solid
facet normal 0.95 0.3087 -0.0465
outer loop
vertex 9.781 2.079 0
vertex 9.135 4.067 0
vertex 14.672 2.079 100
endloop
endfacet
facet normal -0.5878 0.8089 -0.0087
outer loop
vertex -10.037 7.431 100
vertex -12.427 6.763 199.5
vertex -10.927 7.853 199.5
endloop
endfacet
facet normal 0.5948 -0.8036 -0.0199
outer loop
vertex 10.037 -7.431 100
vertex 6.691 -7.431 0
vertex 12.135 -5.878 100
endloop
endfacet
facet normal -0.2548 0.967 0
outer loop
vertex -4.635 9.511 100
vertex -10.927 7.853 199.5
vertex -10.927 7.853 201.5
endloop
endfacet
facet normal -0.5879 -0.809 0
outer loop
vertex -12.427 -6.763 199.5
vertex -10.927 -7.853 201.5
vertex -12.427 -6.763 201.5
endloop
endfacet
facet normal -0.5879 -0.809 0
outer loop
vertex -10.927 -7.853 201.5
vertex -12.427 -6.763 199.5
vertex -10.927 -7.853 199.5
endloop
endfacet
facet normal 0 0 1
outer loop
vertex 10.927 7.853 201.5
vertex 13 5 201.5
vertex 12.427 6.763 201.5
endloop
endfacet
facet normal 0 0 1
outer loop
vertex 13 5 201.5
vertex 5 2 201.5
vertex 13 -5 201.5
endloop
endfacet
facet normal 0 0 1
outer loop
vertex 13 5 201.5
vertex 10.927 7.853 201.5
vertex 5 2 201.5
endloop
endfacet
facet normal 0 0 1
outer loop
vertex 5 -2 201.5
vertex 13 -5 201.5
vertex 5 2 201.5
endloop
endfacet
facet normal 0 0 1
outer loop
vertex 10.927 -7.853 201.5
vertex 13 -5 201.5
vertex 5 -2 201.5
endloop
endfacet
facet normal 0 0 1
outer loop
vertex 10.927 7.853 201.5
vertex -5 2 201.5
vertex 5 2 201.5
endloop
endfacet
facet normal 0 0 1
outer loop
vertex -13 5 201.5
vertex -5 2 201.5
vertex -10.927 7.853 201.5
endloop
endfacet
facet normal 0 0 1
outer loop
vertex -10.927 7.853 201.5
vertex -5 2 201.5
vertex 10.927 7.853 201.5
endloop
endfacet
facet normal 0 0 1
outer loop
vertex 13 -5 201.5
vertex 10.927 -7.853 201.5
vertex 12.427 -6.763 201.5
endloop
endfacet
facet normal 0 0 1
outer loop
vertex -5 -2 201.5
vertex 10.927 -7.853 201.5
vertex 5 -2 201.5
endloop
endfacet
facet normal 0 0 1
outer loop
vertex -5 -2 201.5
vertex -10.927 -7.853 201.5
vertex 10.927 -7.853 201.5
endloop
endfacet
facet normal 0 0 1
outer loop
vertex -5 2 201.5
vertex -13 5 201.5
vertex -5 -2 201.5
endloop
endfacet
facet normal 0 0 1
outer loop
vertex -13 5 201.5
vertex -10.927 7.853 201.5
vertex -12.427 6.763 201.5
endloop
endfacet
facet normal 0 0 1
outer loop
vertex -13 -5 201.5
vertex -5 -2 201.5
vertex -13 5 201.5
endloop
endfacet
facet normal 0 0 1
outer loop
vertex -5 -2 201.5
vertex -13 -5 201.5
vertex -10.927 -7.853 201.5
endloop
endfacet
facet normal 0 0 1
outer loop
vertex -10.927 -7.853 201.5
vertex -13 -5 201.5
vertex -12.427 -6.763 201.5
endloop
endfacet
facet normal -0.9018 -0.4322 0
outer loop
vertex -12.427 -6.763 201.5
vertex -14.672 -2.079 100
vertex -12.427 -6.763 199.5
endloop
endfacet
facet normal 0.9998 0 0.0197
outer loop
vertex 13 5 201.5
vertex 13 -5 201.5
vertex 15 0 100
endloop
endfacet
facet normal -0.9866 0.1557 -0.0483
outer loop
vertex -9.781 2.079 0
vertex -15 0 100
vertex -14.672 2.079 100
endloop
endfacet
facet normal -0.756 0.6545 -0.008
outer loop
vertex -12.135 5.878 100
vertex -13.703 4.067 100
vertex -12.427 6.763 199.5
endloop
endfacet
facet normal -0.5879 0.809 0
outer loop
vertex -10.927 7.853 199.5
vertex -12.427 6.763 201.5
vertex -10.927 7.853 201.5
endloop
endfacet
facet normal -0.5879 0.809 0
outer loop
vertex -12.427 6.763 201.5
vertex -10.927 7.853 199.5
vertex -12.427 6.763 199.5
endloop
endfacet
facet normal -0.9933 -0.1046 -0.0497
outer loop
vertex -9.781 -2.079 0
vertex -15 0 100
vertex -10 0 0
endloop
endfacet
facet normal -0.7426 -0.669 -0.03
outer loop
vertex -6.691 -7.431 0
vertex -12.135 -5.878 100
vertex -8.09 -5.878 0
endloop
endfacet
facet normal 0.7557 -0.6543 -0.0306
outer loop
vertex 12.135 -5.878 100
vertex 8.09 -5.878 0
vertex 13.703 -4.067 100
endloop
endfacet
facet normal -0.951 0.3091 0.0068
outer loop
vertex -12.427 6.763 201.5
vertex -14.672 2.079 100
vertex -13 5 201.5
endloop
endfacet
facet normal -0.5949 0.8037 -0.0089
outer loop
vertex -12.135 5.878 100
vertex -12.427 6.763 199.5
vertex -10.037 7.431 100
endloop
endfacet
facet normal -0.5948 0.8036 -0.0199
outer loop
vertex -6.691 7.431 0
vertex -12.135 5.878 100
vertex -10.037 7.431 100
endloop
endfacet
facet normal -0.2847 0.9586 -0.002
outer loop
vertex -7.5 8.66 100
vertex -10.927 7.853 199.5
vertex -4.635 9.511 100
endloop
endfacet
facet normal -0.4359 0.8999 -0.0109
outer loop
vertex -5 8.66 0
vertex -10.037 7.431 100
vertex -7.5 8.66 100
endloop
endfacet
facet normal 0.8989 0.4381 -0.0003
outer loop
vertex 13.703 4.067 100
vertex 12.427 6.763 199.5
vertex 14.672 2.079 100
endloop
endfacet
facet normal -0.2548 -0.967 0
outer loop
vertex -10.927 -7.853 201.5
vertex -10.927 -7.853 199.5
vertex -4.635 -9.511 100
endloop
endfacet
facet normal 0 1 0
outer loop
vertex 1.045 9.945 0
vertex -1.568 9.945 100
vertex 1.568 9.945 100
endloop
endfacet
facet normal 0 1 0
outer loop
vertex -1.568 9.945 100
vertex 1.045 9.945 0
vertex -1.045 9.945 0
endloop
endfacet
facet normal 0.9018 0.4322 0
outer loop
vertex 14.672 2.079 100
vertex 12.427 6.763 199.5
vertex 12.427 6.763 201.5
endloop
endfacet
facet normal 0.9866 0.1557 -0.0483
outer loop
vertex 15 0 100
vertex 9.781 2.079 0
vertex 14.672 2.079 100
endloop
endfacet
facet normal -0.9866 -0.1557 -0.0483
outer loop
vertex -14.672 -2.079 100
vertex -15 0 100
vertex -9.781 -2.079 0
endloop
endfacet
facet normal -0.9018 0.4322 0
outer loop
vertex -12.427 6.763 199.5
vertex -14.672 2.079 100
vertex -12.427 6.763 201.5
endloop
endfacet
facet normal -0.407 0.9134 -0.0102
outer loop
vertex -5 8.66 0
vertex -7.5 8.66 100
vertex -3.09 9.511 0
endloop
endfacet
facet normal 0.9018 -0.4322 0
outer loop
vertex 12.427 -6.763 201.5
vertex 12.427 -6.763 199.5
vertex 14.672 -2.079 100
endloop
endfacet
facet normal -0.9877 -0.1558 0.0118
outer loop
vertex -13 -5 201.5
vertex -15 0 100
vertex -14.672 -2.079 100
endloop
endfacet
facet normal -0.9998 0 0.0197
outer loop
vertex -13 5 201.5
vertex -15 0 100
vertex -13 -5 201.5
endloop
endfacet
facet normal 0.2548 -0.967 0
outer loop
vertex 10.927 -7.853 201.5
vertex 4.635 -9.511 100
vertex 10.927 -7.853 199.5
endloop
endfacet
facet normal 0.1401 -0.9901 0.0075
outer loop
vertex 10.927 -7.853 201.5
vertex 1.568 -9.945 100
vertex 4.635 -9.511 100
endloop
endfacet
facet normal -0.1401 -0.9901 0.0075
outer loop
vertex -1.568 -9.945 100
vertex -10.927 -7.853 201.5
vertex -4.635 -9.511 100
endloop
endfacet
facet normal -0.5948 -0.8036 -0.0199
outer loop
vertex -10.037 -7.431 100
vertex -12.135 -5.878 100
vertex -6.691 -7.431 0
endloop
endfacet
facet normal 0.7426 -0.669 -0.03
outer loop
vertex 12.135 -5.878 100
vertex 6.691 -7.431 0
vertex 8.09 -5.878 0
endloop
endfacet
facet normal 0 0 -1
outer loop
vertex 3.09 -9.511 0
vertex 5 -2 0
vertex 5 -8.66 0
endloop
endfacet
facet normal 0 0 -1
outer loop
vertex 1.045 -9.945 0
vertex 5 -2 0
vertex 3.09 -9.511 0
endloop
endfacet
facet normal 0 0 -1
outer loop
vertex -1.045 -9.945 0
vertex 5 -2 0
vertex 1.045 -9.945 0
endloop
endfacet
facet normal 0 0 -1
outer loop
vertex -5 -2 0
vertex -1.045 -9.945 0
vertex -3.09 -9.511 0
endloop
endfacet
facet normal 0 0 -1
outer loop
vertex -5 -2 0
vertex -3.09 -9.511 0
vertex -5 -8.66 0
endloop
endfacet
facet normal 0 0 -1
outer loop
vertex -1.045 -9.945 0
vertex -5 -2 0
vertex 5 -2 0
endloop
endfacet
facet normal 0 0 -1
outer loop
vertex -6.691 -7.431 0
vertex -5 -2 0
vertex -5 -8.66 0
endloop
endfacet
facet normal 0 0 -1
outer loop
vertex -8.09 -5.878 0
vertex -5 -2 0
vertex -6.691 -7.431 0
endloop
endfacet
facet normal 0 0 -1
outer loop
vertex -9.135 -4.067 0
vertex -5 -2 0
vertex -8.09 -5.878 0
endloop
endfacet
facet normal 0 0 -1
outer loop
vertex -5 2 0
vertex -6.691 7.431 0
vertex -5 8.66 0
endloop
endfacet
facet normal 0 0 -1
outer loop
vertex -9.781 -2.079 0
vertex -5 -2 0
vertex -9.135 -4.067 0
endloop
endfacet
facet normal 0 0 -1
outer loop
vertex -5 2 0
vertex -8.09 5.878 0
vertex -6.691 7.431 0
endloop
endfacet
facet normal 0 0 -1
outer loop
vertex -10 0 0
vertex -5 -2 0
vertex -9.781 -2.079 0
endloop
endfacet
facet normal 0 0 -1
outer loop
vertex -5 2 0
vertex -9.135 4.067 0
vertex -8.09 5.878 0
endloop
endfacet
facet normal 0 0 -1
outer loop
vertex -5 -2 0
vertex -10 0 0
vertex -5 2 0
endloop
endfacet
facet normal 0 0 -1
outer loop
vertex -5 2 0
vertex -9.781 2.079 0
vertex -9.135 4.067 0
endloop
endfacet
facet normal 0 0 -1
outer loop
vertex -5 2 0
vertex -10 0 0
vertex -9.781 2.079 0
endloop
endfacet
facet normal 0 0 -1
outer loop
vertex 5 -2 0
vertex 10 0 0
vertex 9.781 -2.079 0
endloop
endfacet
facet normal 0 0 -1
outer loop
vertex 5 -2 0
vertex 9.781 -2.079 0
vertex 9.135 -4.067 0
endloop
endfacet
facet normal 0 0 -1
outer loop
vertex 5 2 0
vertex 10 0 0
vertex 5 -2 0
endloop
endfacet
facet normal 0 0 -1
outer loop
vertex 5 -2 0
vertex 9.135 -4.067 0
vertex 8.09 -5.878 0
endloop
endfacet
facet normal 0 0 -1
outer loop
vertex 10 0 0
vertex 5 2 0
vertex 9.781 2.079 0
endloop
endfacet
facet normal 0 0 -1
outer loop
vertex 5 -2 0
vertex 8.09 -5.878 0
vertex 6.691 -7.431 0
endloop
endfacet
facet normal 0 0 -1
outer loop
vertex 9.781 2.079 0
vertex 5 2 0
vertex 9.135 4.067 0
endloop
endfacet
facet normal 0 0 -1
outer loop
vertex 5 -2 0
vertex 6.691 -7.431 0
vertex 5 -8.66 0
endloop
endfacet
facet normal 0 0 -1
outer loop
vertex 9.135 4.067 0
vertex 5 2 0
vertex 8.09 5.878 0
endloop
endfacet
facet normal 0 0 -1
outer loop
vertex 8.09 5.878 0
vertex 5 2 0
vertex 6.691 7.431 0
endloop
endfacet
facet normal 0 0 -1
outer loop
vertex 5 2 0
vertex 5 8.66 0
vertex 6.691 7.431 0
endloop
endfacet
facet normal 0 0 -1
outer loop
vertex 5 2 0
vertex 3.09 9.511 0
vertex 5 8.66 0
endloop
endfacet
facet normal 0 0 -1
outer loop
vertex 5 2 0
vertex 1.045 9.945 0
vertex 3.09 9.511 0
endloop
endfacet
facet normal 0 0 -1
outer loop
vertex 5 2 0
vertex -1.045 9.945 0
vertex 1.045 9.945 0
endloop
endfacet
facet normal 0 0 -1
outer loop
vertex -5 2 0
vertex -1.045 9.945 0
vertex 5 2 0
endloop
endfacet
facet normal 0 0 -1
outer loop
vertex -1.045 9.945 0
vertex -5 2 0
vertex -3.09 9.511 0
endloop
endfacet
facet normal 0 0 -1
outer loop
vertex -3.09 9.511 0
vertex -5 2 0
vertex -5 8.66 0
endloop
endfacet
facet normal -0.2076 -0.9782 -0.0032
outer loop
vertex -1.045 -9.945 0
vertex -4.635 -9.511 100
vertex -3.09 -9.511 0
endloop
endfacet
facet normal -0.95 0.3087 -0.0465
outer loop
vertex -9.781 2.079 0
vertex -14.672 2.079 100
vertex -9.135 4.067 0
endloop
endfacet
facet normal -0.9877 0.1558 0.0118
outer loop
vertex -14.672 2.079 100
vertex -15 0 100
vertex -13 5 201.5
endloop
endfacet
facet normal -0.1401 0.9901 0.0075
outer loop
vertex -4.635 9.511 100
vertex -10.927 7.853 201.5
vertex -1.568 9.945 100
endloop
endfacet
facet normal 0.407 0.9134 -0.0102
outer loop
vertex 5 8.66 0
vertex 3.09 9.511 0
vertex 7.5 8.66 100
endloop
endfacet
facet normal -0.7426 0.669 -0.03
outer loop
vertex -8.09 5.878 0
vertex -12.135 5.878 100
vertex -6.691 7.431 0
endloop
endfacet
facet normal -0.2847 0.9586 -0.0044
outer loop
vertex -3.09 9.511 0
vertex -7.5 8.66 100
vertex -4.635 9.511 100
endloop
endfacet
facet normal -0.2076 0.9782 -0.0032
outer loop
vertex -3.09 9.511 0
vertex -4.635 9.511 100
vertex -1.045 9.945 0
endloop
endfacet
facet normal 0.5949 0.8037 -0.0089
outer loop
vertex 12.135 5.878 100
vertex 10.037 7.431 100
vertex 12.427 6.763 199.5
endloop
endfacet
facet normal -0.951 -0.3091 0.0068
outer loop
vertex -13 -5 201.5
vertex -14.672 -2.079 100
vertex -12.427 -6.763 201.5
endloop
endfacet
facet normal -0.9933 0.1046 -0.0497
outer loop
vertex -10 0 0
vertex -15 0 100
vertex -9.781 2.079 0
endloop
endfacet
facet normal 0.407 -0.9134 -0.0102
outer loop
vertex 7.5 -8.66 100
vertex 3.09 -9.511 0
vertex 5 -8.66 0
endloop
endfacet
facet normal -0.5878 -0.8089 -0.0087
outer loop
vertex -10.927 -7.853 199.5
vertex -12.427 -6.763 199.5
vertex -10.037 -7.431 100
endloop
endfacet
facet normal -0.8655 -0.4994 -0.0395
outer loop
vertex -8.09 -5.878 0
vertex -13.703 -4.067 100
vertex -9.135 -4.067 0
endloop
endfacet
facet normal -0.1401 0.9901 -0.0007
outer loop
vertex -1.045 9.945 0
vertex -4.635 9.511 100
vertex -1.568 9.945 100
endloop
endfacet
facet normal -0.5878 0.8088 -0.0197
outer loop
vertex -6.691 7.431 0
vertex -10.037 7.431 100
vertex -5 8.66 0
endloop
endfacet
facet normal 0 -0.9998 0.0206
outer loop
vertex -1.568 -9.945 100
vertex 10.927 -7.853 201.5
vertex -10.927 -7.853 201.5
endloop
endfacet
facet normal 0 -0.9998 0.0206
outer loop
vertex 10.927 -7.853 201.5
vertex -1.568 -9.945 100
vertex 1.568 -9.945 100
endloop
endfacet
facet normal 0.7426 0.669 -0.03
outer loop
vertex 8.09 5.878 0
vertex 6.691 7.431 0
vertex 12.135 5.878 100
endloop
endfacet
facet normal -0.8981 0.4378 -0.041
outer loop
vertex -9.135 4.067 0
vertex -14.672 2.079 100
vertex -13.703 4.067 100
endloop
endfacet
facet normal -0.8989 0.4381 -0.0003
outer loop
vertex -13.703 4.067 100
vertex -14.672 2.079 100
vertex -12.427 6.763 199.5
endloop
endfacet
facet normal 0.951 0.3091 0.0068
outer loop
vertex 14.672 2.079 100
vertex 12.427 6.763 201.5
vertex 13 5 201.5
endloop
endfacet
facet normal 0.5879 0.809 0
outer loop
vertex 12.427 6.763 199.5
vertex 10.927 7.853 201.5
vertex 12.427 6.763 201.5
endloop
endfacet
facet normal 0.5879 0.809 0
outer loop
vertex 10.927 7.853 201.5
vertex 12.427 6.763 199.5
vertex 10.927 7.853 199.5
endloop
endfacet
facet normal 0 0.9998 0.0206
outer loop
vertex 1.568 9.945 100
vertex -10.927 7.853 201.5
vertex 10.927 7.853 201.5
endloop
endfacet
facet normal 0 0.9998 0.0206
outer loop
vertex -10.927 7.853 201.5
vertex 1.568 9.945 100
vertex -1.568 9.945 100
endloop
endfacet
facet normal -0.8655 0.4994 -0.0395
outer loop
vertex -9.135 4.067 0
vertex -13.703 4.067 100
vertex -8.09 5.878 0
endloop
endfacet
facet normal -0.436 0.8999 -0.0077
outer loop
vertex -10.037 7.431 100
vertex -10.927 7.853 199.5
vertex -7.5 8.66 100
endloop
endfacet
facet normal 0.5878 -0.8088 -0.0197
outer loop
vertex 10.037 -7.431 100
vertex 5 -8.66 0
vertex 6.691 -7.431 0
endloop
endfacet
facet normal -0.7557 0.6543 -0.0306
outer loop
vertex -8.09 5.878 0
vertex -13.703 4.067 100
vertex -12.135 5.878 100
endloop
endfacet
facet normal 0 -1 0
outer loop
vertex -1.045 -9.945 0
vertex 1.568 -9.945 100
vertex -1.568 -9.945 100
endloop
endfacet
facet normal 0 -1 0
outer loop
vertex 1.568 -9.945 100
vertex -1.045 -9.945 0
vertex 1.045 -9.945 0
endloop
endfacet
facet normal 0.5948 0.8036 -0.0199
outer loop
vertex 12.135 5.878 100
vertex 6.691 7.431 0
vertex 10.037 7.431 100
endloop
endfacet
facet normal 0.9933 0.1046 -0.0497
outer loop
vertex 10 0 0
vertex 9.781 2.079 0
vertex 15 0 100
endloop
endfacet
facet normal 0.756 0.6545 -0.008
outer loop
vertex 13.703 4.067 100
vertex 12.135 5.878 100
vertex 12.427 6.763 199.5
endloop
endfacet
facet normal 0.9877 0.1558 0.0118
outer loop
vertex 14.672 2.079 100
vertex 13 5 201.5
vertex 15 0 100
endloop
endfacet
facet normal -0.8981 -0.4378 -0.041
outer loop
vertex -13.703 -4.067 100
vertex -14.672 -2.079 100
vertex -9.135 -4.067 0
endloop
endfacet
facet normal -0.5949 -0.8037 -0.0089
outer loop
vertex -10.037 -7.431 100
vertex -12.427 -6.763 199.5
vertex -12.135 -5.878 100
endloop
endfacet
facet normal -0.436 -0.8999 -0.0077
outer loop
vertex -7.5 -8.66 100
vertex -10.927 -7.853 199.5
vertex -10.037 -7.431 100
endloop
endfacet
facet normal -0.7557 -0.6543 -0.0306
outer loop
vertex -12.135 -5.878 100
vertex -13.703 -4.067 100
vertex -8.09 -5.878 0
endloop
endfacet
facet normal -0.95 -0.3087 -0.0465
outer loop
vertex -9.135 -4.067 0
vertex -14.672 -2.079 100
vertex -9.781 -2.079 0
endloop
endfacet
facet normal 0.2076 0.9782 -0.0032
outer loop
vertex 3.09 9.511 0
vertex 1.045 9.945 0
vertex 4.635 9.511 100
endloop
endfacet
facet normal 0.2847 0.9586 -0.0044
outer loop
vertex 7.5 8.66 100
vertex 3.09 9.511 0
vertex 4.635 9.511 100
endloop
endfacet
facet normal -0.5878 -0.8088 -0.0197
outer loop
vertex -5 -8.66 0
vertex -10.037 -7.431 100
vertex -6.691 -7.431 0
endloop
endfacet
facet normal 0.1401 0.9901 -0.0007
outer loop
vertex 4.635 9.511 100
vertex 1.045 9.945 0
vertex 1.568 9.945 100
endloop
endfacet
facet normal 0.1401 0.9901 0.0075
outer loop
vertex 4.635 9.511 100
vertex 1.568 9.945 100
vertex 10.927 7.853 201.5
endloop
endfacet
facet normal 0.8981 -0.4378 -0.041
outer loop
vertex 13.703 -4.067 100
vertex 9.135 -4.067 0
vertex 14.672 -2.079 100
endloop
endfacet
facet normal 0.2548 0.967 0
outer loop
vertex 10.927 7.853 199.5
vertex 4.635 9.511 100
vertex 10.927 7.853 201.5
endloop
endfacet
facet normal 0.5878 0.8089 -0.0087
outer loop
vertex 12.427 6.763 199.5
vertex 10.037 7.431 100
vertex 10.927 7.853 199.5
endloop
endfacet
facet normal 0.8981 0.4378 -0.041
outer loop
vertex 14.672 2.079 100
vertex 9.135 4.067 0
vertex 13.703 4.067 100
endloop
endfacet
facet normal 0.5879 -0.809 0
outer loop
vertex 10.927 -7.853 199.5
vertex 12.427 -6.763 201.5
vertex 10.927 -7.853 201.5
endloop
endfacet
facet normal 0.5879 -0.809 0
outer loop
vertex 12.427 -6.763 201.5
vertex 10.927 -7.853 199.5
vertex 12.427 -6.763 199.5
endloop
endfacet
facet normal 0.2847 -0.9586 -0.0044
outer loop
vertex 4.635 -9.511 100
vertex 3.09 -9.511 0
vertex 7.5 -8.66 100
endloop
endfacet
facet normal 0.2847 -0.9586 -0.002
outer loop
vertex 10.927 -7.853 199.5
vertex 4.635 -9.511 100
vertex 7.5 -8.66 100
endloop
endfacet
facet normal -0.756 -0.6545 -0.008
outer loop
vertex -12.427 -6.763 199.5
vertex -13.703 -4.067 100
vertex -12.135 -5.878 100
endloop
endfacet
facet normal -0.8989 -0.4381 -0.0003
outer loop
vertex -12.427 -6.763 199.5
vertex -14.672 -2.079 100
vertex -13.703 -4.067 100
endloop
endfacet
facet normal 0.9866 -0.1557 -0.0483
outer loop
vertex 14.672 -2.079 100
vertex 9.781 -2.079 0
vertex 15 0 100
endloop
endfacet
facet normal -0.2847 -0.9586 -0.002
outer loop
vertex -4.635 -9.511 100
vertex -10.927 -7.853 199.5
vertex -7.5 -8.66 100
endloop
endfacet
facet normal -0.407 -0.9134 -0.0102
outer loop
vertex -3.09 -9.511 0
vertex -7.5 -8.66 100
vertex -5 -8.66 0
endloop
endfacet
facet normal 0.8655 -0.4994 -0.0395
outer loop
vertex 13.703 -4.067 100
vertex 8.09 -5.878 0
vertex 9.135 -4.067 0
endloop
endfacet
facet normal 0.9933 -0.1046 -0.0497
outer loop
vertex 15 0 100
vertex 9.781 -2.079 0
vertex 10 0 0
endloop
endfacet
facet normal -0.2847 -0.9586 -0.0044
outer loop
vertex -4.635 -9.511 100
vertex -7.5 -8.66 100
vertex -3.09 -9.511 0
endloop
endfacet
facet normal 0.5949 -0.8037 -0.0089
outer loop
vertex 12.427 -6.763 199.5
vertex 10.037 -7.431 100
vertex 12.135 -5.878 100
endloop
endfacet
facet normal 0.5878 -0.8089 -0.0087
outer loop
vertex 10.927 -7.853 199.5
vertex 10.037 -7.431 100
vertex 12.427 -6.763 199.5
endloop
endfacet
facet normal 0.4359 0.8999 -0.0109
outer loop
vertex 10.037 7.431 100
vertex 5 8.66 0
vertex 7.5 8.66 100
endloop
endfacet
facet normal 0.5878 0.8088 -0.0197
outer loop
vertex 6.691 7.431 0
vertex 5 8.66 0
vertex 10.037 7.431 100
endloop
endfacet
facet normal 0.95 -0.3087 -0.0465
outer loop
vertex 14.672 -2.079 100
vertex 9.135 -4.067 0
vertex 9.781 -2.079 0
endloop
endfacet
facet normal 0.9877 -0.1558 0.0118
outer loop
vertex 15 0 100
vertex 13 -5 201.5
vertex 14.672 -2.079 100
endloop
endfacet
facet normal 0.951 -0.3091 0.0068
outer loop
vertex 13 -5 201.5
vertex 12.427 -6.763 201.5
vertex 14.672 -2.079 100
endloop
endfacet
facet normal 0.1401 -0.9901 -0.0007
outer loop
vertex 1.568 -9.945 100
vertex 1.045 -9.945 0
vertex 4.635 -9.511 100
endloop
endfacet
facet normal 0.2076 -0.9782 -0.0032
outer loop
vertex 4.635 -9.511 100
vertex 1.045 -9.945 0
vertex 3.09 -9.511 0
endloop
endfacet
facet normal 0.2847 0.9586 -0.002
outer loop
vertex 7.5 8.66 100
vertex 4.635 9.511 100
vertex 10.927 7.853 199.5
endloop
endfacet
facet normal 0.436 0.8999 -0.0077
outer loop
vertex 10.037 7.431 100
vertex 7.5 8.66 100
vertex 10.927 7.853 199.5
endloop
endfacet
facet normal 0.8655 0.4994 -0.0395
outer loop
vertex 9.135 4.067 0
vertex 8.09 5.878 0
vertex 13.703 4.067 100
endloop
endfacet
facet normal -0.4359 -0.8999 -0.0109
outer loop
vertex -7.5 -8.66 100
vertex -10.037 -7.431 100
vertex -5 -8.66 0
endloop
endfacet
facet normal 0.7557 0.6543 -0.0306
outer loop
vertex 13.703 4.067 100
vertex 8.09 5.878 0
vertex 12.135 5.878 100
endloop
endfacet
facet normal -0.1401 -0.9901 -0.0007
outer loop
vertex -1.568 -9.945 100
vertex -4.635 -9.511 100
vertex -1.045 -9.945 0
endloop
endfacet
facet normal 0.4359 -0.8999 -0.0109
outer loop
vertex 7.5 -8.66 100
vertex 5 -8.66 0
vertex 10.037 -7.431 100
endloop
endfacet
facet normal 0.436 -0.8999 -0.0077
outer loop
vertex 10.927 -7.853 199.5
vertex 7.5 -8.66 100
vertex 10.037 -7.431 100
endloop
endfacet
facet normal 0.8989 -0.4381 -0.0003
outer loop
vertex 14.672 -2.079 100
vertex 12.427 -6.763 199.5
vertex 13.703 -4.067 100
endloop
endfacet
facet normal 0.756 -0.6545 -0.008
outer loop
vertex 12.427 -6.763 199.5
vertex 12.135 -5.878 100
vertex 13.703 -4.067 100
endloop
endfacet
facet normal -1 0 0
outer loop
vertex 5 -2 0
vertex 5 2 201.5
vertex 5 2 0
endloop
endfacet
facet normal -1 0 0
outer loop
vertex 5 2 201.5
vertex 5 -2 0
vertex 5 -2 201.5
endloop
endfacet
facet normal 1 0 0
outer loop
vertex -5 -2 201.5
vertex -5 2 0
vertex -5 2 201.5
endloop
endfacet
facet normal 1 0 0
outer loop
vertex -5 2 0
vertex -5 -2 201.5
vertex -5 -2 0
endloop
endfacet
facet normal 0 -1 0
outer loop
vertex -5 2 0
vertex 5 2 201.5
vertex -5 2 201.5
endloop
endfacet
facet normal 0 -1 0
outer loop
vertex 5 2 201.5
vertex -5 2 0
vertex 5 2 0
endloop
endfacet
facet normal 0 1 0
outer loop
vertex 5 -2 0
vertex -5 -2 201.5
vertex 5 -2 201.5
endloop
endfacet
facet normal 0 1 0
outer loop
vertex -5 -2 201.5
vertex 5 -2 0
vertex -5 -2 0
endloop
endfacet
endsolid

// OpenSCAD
difference() {
hull() {
cylinder (r = 10, h = 10);
translate ([0,0,100])
scale([1.5, 1, 1])
  sphere(r = 10);
translate ([0,0,200])
minkowski() {
	cube([20, 10, 1], center=true);
	cylinder(r=3);
};
}


translate([-5, -2, ,-5])
cube([10, 4, 230]);
}
